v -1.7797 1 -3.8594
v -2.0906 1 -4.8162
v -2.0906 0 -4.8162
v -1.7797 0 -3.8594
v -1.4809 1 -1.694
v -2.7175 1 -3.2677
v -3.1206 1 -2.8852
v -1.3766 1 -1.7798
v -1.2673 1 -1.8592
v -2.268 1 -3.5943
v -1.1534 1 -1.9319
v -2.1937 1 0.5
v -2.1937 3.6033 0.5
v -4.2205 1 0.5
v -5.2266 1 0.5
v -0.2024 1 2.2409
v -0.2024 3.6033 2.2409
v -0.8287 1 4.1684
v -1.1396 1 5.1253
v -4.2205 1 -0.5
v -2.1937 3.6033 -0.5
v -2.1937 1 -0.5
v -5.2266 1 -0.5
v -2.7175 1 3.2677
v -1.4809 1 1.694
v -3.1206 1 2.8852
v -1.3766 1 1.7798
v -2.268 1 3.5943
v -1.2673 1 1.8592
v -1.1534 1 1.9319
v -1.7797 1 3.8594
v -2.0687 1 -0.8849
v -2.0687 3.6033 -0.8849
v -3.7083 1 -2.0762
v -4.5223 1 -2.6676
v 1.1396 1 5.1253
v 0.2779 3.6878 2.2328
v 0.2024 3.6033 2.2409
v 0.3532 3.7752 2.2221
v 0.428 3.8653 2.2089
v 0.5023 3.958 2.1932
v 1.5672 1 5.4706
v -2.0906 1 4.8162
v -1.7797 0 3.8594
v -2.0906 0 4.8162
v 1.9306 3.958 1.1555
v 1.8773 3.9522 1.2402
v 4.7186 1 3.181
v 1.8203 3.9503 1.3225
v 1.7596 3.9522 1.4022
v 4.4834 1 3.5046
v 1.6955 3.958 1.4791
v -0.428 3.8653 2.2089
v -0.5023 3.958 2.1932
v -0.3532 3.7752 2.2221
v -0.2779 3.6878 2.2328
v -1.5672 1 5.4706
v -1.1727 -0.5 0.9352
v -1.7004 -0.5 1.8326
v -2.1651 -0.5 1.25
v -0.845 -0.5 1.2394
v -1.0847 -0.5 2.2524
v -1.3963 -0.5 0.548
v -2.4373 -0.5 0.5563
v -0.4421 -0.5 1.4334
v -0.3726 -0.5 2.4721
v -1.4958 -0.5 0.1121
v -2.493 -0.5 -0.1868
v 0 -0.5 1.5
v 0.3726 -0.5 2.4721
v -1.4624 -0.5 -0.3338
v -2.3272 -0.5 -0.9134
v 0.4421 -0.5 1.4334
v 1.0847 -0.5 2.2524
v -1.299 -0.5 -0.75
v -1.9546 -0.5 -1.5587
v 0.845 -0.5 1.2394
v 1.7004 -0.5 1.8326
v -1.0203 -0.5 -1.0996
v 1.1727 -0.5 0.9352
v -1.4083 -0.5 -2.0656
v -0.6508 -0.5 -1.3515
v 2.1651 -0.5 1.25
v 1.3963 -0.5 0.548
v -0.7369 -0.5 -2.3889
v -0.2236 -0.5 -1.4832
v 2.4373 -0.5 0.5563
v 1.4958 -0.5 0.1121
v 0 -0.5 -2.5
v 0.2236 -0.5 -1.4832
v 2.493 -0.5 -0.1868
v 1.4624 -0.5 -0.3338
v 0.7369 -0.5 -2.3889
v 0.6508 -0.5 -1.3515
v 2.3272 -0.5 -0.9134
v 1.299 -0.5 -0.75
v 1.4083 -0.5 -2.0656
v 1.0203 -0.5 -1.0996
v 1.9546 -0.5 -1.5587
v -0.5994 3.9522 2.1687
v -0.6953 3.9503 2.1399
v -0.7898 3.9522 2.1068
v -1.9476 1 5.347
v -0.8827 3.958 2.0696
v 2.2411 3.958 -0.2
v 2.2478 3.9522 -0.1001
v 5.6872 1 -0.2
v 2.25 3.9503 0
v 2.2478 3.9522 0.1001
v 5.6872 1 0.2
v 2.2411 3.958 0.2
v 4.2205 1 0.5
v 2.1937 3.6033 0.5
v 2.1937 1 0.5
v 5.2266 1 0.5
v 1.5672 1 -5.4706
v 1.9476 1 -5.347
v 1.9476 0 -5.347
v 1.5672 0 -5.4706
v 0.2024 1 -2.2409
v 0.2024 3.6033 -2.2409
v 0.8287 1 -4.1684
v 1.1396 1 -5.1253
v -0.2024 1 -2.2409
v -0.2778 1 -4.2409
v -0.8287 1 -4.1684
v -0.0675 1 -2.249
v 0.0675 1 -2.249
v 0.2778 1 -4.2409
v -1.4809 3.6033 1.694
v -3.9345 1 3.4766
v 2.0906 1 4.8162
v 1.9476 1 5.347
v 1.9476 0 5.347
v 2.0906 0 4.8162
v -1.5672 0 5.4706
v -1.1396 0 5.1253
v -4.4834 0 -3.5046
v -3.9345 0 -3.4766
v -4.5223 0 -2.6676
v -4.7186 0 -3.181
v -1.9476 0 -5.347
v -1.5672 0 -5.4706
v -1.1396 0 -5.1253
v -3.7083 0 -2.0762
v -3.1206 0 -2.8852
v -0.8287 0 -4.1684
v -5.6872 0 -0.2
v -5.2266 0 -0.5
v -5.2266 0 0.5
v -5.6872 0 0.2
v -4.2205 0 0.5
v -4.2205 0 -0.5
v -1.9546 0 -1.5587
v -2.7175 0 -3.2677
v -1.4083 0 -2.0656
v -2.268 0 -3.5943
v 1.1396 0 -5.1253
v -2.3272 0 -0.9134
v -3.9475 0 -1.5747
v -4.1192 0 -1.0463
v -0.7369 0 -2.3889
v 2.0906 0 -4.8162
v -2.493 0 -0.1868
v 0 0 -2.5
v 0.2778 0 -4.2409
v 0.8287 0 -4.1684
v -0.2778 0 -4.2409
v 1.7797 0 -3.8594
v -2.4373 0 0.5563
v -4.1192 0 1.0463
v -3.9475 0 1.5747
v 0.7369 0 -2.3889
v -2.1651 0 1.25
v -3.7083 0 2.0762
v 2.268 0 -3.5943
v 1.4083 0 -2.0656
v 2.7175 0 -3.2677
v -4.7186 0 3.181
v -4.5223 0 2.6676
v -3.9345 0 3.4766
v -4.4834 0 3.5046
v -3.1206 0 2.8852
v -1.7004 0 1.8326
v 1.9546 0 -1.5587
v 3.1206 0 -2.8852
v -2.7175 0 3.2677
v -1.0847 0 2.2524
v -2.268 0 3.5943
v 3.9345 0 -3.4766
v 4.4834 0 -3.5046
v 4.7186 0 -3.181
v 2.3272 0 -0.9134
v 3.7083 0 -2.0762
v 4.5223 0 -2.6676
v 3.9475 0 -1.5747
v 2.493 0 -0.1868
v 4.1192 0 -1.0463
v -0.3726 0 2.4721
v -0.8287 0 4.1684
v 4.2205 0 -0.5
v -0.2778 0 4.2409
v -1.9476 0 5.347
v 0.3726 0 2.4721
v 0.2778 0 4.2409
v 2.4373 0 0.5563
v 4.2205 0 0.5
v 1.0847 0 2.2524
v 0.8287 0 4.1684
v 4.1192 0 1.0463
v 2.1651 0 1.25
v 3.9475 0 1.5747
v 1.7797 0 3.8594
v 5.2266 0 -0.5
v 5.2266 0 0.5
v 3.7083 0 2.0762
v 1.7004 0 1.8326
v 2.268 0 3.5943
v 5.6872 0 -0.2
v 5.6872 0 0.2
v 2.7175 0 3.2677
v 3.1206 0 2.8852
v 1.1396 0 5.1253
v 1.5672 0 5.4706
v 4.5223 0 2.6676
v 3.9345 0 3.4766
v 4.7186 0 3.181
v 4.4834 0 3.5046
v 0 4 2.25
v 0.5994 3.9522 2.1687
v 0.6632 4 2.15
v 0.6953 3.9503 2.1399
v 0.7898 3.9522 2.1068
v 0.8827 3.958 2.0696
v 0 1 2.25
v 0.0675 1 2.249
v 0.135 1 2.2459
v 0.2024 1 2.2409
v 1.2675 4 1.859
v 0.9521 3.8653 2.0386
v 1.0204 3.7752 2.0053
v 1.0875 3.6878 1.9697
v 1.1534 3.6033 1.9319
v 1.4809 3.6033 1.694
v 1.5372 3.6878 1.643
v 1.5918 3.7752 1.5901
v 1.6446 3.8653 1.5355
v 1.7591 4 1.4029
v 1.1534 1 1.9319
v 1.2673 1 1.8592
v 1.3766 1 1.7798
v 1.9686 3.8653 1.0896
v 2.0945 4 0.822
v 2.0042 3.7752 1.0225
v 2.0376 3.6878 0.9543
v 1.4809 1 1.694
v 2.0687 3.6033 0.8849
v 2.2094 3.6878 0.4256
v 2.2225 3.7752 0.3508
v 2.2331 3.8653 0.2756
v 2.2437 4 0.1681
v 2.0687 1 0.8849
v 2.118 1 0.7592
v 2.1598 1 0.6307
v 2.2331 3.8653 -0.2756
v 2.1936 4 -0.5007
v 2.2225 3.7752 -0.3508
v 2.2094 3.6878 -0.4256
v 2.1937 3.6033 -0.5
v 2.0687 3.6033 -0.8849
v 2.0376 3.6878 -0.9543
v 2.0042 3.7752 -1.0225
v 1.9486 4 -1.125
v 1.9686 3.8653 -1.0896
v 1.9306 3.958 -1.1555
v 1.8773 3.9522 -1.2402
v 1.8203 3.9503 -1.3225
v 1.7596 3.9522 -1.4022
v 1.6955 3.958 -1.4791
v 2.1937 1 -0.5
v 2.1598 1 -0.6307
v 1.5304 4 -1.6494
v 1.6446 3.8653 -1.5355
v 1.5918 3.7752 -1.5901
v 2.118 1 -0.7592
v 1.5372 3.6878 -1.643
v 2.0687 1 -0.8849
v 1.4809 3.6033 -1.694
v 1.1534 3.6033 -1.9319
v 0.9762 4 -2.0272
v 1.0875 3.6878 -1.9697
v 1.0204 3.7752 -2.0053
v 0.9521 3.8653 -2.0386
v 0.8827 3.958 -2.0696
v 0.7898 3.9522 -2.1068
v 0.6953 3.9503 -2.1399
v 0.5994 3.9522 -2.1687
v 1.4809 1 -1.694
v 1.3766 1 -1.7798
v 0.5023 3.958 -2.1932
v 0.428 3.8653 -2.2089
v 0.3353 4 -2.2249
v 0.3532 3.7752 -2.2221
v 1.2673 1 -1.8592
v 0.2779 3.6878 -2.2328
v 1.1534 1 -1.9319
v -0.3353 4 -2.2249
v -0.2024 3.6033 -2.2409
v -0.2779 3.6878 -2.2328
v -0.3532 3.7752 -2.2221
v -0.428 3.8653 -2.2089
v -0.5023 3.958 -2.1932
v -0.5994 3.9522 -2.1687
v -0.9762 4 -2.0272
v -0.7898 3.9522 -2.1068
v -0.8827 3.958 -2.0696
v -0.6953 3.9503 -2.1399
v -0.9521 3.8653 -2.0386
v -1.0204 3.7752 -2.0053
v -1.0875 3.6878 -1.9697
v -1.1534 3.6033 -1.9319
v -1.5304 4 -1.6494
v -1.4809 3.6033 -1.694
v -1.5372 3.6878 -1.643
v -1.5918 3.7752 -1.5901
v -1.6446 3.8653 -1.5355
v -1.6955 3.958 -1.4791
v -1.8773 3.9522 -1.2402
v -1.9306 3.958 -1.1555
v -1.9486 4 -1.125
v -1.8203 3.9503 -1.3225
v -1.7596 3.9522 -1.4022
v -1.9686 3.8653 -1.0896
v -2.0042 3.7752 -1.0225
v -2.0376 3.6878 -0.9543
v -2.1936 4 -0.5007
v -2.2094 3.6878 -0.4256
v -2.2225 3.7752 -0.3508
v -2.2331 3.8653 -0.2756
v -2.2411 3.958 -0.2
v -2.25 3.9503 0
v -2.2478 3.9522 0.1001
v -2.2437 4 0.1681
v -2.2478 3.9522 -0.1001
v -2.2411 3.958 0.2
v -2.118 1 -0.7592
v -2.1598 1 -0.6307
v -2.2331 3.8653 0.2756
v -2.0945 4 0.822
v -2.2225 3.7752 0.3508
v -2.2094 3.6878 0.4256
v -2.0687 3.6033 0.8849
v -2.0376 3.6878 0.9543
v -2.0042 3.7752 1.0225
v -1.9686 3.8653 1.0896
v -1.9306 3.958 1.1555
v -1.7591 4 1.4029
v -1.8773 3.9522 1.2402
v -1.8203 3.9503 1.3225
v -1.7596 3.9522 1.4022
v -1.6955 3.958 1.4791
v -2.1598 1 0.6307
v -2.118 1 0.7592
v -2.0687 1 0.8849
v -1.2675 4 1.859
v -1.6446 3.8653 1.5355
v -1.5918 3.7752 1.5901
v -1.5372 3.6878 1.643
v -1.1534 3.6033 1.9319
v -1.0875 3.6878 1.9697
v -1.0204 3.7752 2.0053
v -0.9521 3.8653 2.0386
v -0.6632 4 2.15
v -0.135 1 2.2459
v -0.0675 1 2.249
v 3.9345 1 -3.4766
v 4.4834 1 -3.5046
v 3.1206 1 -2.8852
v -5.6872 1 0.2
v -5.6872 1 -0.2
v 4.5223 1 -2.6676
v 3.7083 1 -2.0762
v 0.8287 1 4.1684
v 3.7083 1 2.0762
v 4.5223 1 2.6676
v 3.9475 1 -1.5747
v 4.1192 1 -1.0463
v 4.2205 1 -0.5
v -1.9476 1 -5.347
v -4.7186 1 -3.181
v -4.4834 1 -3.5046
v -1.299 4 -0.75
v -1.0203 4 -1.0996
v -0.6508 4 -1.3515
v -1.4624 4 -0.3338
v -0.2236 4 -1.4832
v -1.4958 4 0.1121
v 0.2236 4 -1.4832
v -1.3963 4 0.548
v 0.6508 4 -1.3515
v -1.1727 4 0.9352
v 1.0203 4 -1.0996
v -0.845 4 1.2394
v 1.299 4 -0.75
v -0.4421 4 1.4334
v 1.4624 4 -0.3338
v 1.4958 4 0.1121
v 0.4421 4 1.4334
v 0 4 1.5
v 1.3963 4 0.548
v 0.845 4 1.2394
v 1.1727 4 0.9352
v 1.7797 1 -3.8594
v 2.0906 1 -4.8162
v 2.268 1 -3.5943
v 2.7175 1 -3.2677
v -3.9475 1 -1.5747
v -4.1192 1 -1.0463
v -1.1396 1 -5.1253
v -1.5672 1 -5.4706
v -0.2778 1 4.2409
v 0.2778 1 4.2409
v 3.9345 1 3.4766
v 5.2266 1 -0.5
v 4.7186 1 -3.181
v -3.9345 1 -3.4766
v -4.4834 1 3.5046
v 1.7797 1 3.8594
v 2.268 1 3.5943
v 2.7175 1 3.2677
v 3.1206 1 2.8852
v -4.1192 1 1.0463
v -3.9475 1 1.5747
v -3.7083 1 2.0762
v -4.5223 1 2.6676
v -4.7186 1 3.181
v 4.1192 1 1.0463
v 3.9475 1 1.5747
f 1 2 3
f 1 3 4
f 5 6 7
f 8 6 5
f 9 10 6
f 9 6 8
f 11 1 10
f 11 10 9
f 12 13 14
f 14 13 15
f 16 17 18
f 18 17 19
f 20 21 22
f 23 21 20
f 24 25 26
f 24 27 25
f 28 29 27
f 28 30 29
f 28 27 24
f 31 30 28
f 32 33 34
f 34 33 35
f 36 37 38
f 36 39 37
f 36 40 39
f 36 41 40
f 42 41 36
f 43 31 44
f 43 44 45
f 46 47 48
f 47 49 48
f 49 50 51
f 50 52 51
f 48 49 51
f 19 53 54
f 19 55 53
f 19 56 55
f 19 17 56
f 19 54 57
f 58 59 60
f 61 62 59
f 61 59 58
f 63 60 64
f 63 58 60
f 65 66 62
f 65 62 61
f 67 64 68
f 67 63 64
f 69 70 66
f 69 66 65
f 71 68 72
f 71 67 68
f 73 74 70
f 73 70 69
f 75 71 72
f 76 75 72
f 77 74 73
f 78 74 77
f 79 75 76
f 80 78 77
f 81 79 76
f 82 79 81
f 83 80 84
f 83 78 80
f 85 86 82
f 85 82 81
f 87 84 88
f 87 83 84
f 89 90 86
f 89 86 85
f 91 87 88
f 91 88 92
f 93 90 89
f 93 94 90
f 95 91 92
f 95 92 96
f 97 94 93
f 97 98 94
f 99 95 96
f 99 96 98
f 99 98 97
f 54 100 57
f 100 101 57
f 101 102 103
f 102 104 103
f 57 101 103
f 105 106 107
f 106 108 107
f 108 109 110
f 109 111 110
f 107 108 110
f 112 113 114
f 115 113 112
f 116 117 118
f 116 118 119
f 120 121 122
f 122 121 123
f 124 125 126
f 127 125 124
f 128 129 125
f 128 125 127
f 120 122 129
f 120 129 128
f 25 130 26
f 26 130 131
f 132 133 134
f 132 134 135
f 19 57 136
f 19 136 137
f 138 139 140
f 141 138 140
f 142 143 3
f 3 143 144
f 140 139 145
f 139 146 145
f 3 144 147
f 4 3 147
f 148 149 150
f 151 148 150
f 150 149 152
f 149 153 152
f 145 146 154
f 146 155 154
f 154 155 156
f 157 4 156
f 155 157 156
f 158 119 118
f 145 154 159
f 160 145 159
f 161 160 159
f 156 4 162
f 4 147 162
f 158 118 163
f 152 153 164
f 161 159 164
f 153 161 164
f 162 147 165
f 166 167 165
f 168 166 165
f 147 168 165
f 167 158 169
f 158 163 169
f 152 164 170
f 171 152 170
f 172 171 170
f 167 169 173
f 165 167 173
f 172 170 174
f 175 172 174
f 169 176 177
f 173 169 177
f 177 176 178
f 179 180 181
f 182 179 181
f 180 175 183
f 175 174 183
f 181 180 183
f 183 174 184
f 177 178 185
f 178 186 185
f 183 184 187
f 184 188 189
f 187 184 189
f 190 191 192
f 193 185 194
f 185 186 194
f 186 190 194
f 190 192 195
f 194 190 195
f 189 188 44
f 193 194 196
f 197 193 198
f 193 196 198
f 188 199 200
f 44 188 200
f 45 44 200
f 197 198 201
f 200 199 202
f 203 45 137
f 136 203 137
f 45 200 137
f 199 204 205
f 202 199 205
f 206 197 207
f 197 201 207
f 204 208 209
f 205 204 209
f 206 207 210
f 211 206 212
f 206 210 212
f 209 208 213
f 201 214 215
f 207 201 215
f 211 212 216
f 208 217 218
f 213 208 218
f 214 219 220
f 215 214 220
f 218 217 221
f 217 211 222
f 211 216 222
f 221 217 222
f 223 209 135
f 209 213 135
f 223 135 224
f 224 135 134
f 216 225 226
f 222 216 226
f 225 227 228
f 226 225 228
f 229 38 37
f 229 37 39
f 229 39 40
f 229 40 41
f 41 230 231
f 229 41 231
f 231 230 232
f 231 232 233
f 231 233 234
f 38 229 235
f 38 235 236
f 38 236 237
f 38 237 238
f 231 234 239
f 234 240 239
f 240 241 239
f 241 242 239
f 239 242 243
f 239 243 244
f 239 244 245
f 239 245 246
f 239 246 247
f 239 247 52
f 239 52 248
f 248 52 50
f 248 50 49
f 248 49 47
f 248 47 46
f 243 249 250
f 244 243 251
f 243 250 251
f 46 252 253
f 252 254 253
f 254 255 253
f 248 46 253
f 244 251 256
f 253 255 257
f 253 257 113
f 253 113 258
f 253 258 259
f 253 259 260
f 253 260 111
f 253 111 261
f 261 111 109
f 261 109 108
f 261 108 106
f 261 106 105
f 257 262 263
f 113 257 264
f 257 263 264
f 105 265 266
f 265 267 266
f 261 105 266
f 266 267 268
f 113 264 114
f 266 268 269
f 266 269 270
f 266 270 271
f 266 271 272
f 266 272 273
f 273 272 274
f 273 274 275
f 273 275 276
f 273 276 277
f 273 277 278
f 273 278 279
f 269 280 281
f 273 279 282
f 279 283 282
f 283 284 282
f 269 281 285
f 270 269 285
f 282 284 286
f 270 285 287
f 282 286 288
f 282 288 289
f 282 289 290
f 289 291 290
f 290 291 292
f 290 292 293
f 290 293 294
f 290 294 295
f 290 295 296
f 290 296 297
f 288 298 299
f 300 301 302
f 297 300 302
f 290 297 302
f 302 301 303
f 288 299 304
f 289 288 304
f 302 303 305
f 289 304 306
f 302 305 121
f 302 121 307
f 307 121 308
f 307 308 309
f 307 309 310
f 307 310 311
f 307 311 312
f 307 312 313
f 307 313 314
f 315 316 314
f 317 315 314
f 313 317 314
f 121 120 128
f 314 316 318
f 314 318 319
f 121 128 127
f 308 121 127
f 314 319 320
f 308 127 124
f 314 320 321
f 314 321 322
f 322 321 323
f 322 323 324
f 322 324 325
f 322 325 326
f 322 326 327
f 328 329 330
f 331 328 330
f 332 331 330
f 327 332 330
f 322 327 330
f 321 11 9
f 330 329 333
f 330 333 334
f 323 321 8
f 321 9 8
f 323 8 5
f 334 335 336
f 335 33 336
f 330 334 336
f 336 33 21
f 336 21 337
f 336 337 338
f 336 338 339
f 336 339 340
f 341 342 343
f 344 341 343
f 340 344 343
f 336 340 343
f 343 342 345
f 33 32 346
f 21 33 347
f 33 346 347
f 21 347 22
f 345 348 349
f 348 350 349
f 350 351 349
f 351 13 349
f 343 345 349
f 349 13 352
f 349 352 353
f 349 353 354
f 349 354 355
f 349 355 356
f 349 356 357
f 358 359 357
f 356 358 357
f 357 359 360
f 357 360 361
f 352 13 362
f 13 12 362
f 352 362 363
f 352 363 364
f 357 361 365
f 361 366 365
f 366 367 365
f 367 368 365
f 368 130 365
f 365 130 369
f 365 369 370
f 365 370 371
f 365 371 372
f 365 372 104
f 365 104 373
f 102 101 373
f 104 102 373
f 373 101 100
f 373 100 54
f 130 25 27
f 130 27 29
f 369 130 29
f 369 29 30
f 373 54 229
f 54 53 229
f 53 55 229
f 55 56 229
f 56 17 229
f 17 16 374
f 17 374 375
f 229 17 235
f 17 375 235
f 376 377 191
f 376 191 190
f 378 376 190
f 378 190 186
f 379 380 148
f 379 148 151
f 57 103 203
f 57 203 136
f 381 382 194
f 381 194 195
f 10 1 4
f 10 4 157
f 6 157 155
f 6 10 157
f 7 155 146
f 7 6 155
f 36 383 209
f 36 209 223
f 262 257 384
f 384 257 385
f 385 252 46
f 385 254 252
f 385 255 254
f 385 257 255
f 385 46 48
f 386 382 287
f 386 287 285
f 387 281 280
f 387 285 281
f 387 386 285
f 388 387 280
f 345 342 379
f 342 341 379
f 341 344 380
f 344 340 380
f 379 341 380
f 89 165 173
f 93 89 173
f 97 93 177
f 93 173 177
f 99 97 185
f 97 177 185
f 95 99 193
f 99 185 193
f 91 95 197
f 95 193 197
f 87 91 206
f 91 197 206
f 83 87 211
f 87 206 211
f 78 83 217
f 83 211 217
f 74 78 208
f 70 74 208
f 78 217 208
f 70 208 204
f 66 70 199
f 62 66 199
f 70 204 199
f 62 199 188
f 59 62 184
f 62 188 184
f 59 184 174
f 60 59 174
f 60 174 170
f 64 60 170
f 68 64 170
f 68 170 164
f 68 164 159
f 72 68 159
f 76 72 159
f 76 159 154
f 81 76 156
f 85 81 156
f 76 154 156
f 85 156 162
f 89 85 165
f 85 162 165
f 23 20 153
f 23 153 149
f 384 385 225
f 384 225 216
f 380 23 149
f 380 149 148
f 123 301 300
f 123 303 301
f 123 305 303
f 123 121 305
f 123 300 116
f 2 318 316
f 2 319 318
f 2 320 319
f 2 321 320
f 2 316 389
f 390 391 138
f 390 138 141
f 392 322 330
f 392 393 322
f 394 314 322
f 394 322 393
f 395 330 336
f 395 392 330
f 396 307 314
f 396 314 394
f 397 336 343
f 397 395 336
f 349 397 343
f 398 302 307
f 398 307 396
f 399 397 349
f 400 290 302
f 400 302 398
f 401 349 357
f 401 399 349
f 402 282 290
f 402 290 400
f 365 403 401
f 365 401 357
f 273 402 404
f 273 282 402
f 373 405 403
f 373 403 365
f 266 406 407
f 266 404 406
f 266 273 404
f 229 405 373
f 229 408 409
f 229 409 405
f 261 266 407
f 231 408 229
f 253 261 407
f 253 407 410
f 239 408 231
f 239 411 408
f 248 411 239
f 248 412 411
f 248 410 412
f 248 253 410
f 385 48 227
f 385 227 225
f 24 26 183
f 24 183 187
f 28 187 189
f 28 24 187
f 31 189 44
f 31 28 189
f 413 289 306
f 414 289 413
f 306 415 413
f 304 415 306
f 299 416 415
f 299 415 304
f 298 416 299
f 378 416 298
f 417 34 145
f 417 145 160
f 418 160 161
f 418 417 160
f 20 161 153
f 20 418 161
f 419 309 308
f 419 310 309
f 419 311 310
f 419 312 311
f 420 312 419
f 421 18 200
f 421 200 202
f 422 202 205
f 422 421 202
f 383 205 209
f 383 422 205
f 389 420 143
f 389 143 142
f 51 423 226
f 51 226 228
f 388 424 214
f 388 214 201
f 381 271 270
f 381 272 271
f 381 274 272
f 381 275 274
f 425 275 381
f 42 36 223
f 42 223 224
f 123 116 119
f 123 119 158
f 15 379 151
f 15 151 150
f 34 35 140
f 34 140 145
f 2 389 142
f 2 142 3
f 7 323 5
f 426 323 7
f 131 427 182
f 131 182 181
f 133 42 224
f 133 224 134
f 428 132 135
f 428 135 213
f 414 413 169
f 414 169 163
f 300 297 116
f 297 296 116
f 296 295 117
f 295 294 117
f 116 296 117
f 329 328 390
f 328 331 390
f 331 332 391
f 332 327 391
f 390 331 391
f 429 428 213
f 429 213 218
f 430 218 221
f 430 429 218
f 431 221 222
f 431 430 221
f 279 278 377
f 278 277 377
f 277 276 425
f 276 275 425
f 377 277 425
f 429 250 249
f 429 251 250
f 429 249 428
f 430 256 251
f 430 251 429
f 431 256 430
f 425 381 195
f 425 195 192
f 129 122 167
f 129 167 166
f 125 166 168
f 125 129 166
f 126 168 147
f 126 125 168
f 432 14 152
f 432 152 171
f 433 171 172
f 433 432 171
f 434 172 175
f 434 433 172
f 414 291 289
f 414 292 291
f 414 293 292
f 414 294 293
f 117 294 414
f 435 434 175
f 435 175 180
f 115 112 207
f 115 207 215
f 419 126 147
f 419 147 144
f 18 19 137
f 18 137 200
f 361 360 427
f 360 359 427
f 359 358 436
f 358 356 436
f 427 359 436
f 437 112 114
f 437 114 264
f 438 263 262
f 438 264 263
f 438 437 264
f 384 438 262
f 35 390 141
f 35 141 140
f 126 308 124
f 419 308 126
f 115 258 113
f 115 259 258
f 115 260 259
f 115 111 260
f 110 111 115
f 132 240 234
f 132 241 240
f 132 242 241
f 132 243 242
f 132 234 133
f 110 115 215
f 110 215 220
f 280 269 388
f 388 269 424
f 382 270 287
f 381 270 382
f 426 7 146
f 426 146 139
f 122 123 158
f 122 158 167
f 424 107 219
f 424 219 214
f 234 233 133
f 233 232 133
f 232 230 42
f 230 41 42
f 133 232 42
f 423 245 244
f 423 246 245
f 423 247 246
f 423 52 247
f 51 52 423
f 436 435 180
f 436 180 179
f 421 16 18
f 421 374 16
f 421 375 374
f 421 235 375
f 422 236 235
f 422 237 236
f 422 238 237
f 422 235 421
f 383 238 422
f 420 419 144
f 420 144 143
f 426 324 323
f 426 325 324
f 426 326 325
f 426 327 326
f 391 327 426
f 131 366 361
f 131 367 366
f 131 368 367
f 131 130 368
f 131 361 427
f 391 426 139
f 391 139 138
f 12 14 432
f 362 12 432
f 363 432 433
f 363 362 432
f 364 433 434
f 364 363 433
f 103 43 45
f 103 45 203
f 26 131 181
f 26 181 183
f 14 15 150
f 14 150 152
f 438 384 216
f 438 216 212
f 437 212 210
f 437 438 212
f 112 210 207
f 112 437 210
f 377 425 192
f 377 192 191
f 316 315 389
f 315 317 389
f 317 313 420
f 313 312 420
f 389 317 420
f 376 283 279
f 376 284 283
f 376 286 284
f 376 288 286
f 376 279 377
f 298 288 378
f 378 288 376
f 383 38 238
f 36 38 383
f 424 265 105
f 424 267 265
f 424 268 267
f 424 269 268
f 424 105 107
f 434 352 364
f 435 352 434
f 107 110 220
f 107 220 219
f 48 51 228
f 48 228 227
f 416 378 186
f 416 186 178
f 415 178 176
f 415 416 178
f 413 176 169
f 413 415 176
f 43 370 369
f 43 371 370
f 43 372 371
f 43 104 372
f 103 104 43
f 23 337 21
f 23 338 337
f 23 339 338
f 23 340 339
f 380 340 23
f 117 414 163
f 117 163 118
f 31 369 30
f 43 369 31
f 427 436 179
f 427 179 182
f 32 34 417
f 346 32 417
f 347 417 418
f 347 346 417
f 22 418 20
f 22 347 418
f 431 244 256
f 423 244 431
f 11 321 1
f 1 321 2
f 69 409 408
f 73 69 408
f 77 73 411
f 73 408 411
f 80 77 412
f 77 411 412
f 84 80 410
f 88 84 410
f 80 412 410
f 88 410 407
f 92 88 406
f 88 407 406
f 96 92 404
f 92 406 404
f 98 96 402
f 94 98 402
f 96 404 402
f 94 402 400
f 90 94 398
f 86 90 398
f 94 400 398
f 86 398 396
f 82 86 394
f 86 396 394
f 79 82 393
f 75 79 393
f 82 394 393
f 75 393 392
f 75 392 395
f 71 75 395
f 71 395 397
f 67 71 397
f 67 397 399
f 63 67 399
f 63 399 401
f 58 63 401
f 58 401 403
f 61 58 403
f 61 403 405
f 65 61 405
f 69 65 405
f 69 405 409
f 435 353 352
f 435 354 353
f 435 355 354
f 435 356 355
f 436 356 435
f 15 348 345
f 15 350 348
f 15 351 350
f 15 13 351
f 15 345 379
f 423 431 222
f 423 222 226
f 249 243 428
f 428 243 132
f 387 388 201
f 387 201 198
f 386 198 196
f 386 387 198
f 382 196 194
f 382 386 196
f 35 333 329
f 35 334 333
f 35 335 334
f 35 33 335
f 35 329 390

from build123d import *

# Parameters (mm, degrees)
SKETCH1_R                    = 5.75
BOSS_EXTRUDE1_DEPTH          = 1
SKETCH2_R                    = 2.25
BOSS_EXTRUDE2_DEPTH          = 3
RIB2_REACH                   = 11.062
SKETCH3_WALL_W               = 24.654296494
SKETCH3_WALL_H               = 1
CHAMFER1_SIZE                = 0.3
CIRPATTERN1_COUNT            = 10
CHAMFER1_OF_CIRPATTERN1_SIZE = 0.3
SKETCH5_R                    = 2.5
BOSS_EXTRUDE4_DEPTH          = 0.5
SKETCH6_R                    = 1.5
CUT_EXTRUDE1_DEPTH           = 10.293815148
CUT_EXTRUDE2_DEPTH           = 9.667467912
CIRPATTERN2_COUNT            = 10


with BuildPart() as part:
    # Sketch1 → Boss-Extrude1 (new body)
    with BuildSketch(Plane(origin=(0, 0, 0), x_dir=(1, 0, 0), z_dir=(0, 1, 0))):
        with Locations(Location((0, 0, 0), (0, 0, 270))):
            Circle(SKETCH1_R)
    extrude(amount=BOSS_EXTRUDE1_DEPTH)

    # Sketch2 → Boss-Extrude2 (add)
    with BuildSketch(Plane(origin=(0, 1, 0), x_dir=(1, 0, 0), z_dir=(0, 1, 0))):
        with Locations(Location((0, 0, 0), (0, 0, 270))):
            Circle(SKETCH2_R)
    extrude(amount=BOSS_EXTRUDE2_DEPTH)

    # Sketch3 wall → Rib2 (add, up to next)
    with BuildSketch(Plane(origin=(-3.968577633, 2.475160602, 0), x_dir=(-0.758799561347, -0.651324209361, 0), z_dir=(0.651324209361, -0.758799561347, 0)), mode=Mode.PRIVATE) as rib2_sk1:
        Rectangle(SKETCH3_WALL_W, SKETCH3_WALL_H)
    rib2_tool1 = extrude(rib2_sk1.sketch, amount=RIB2_REACH, mode=Mode.PRIVATE) - part.part
    rib2 = rib2_tool1.solids().sort_by_distance((-3.968577633, 2.475160602, 0))[0]
    add(rib2)

    # Chamfer1
    chamfer1_edges = [part.edges().sort_by_distance(p)[0] for p in [
        (-3.940448181, 2.499305836, -0.5),
        (-3.940448181, 2.499305836, 0.5),
    ]]
    chamfer(chamfer1_edges, length=CHAMFER1_SIZE)

    # CirPattern1: Rib2 ×10 about axis
    cirpattern1_axis = Axis((0, 0, 0), (0, 1, 0))
    for i in range(1, CIRPATTERN1_COUNT):
        add(rib2.rotate(cirpattern1_axis, i * 360 / CIRPATTERN1_COUNT))

    # Chamfer1 of CirPattern1
    chamfer1_of_cirpattern1_edges = [part.edges().sort_by_distance(p)[0] for p in [
        (-3.48178217, 2.499305836, 1.911628831),
        (-2.893996918, 2.499305836, 2.720645826),
        (-1.693193712, 2.499305836, 3.593080423),
        (-0.742137195, 2.499305836, 3.902097417),
        (0.742137195, 2.499305836, 3.902097417),
        (1.693193712, 2.499305836, 3.593080423),
        (2.893996918, 2.499305836, 2.720645826),
        (3.48178217, 2.499305836, 1.911628831),
        (3.940448181, 2.499305836, 0.5),
        (3.940448181, 2.499305836, -0.5),
        (3.48178217, 2.499305836, -1.911628831),
        (2.893996918, 2.499305836, -2.720645826),
        (1.693193712, 2.499305836, -3.593080423),
        (0.742137195, 2.499305836, -3.902097417),
        (-0.742137195, 2.499305836, -3.902097417),
        (-1.693193712, 2.499305836, -3.593080423),
        (-2.893996918, 2.499305836, -2.720645826),
        (-3.48178217, 2.499305836, -1.911628831),
    ]]
    chamfer(chamfer1_of_cirpattern1_edges, length=CHAMFER1_OF_CIRPATTERN1_SIZE)

    # Sketch5 → Boss-Extrude4 (add)
    with BuildSketch(Plane.XZ):
        with Locations(Location((0, 0, 0), (0, 0, 270))):
            Circle(SKETCH5_R)
    extrude(amount=BOSS_EXTRUDE4_DEPTH)

    # Sketch6 → Cut-Extrude1 (cut, through all)
    with BuildSketch(Plane(origin=(0, 4, 0), x_dir=(1, 0, 0), z_dir=(0, 1, 0))):
        with Locations(Location((0, 0, 0), (0, 0, 270))):
            Circle(SKETCH6_R)
    extrude(amount=-CUT_EXTRUDE1_DEPTH, mode=Mode.SUBTRACT)

    # Sketch8 → Cut-Extrude2 (cut, through all)
    with BuildSketch(Plane(origin=(0, 1, 0), x_dir=(1, 0, 0), z_dir=(0, 1, 0))):
        with BuildLine():
            Line((-1.94763893, -5.347002675), (-1.567216323, -5.470609473))
            Line((-1.567216323, -5.470609473), (-1.139566108, -5.125257839))
            Line((-1.139566108, -5.125257839), (-0.828673564, -4.168428975))
            ThreePointArc((-0.828673564, -4.168428975), (0, -4.25), (0.828673564, -4.168428975))
            Line((0.828673564, -4.168428975), (1.139566108, -5.125257839))
            Line((1.139566108, -5.125257839), (1.567216323, -5.470609473))
            Line((1.567216323, -5.470609473), (1.649704909, -5.578945165))
            Line((1.649704909, -5.578945165), (0.683984218, -7.712906306))
            Line((0.683984218, -7.712906306), (-2.388981324, -6.322240681))
            Line((-2.388981324, -6.322240681), (-1.94763893, -5.347002675))
        make_face()
    cut_extrude2 = extrude(amount=-CUT_EXTRUDE2_DEPTH, mode=Mode.SUBTRACT)

    # CirPattern2: Cut-Extrude2 ×10 about axis
    cirpattern2_axis = Axis((0, 0, 0), (0, 1, 0))
    for i in range(1, CIRPATTERN2_COUNT):
        add(cut_extrude2.rotate(cirpattern2_axis, i * 360 / CIRPATTERN2_COUNT), mode=Mode.SUBTRACT)


solid = part.part
